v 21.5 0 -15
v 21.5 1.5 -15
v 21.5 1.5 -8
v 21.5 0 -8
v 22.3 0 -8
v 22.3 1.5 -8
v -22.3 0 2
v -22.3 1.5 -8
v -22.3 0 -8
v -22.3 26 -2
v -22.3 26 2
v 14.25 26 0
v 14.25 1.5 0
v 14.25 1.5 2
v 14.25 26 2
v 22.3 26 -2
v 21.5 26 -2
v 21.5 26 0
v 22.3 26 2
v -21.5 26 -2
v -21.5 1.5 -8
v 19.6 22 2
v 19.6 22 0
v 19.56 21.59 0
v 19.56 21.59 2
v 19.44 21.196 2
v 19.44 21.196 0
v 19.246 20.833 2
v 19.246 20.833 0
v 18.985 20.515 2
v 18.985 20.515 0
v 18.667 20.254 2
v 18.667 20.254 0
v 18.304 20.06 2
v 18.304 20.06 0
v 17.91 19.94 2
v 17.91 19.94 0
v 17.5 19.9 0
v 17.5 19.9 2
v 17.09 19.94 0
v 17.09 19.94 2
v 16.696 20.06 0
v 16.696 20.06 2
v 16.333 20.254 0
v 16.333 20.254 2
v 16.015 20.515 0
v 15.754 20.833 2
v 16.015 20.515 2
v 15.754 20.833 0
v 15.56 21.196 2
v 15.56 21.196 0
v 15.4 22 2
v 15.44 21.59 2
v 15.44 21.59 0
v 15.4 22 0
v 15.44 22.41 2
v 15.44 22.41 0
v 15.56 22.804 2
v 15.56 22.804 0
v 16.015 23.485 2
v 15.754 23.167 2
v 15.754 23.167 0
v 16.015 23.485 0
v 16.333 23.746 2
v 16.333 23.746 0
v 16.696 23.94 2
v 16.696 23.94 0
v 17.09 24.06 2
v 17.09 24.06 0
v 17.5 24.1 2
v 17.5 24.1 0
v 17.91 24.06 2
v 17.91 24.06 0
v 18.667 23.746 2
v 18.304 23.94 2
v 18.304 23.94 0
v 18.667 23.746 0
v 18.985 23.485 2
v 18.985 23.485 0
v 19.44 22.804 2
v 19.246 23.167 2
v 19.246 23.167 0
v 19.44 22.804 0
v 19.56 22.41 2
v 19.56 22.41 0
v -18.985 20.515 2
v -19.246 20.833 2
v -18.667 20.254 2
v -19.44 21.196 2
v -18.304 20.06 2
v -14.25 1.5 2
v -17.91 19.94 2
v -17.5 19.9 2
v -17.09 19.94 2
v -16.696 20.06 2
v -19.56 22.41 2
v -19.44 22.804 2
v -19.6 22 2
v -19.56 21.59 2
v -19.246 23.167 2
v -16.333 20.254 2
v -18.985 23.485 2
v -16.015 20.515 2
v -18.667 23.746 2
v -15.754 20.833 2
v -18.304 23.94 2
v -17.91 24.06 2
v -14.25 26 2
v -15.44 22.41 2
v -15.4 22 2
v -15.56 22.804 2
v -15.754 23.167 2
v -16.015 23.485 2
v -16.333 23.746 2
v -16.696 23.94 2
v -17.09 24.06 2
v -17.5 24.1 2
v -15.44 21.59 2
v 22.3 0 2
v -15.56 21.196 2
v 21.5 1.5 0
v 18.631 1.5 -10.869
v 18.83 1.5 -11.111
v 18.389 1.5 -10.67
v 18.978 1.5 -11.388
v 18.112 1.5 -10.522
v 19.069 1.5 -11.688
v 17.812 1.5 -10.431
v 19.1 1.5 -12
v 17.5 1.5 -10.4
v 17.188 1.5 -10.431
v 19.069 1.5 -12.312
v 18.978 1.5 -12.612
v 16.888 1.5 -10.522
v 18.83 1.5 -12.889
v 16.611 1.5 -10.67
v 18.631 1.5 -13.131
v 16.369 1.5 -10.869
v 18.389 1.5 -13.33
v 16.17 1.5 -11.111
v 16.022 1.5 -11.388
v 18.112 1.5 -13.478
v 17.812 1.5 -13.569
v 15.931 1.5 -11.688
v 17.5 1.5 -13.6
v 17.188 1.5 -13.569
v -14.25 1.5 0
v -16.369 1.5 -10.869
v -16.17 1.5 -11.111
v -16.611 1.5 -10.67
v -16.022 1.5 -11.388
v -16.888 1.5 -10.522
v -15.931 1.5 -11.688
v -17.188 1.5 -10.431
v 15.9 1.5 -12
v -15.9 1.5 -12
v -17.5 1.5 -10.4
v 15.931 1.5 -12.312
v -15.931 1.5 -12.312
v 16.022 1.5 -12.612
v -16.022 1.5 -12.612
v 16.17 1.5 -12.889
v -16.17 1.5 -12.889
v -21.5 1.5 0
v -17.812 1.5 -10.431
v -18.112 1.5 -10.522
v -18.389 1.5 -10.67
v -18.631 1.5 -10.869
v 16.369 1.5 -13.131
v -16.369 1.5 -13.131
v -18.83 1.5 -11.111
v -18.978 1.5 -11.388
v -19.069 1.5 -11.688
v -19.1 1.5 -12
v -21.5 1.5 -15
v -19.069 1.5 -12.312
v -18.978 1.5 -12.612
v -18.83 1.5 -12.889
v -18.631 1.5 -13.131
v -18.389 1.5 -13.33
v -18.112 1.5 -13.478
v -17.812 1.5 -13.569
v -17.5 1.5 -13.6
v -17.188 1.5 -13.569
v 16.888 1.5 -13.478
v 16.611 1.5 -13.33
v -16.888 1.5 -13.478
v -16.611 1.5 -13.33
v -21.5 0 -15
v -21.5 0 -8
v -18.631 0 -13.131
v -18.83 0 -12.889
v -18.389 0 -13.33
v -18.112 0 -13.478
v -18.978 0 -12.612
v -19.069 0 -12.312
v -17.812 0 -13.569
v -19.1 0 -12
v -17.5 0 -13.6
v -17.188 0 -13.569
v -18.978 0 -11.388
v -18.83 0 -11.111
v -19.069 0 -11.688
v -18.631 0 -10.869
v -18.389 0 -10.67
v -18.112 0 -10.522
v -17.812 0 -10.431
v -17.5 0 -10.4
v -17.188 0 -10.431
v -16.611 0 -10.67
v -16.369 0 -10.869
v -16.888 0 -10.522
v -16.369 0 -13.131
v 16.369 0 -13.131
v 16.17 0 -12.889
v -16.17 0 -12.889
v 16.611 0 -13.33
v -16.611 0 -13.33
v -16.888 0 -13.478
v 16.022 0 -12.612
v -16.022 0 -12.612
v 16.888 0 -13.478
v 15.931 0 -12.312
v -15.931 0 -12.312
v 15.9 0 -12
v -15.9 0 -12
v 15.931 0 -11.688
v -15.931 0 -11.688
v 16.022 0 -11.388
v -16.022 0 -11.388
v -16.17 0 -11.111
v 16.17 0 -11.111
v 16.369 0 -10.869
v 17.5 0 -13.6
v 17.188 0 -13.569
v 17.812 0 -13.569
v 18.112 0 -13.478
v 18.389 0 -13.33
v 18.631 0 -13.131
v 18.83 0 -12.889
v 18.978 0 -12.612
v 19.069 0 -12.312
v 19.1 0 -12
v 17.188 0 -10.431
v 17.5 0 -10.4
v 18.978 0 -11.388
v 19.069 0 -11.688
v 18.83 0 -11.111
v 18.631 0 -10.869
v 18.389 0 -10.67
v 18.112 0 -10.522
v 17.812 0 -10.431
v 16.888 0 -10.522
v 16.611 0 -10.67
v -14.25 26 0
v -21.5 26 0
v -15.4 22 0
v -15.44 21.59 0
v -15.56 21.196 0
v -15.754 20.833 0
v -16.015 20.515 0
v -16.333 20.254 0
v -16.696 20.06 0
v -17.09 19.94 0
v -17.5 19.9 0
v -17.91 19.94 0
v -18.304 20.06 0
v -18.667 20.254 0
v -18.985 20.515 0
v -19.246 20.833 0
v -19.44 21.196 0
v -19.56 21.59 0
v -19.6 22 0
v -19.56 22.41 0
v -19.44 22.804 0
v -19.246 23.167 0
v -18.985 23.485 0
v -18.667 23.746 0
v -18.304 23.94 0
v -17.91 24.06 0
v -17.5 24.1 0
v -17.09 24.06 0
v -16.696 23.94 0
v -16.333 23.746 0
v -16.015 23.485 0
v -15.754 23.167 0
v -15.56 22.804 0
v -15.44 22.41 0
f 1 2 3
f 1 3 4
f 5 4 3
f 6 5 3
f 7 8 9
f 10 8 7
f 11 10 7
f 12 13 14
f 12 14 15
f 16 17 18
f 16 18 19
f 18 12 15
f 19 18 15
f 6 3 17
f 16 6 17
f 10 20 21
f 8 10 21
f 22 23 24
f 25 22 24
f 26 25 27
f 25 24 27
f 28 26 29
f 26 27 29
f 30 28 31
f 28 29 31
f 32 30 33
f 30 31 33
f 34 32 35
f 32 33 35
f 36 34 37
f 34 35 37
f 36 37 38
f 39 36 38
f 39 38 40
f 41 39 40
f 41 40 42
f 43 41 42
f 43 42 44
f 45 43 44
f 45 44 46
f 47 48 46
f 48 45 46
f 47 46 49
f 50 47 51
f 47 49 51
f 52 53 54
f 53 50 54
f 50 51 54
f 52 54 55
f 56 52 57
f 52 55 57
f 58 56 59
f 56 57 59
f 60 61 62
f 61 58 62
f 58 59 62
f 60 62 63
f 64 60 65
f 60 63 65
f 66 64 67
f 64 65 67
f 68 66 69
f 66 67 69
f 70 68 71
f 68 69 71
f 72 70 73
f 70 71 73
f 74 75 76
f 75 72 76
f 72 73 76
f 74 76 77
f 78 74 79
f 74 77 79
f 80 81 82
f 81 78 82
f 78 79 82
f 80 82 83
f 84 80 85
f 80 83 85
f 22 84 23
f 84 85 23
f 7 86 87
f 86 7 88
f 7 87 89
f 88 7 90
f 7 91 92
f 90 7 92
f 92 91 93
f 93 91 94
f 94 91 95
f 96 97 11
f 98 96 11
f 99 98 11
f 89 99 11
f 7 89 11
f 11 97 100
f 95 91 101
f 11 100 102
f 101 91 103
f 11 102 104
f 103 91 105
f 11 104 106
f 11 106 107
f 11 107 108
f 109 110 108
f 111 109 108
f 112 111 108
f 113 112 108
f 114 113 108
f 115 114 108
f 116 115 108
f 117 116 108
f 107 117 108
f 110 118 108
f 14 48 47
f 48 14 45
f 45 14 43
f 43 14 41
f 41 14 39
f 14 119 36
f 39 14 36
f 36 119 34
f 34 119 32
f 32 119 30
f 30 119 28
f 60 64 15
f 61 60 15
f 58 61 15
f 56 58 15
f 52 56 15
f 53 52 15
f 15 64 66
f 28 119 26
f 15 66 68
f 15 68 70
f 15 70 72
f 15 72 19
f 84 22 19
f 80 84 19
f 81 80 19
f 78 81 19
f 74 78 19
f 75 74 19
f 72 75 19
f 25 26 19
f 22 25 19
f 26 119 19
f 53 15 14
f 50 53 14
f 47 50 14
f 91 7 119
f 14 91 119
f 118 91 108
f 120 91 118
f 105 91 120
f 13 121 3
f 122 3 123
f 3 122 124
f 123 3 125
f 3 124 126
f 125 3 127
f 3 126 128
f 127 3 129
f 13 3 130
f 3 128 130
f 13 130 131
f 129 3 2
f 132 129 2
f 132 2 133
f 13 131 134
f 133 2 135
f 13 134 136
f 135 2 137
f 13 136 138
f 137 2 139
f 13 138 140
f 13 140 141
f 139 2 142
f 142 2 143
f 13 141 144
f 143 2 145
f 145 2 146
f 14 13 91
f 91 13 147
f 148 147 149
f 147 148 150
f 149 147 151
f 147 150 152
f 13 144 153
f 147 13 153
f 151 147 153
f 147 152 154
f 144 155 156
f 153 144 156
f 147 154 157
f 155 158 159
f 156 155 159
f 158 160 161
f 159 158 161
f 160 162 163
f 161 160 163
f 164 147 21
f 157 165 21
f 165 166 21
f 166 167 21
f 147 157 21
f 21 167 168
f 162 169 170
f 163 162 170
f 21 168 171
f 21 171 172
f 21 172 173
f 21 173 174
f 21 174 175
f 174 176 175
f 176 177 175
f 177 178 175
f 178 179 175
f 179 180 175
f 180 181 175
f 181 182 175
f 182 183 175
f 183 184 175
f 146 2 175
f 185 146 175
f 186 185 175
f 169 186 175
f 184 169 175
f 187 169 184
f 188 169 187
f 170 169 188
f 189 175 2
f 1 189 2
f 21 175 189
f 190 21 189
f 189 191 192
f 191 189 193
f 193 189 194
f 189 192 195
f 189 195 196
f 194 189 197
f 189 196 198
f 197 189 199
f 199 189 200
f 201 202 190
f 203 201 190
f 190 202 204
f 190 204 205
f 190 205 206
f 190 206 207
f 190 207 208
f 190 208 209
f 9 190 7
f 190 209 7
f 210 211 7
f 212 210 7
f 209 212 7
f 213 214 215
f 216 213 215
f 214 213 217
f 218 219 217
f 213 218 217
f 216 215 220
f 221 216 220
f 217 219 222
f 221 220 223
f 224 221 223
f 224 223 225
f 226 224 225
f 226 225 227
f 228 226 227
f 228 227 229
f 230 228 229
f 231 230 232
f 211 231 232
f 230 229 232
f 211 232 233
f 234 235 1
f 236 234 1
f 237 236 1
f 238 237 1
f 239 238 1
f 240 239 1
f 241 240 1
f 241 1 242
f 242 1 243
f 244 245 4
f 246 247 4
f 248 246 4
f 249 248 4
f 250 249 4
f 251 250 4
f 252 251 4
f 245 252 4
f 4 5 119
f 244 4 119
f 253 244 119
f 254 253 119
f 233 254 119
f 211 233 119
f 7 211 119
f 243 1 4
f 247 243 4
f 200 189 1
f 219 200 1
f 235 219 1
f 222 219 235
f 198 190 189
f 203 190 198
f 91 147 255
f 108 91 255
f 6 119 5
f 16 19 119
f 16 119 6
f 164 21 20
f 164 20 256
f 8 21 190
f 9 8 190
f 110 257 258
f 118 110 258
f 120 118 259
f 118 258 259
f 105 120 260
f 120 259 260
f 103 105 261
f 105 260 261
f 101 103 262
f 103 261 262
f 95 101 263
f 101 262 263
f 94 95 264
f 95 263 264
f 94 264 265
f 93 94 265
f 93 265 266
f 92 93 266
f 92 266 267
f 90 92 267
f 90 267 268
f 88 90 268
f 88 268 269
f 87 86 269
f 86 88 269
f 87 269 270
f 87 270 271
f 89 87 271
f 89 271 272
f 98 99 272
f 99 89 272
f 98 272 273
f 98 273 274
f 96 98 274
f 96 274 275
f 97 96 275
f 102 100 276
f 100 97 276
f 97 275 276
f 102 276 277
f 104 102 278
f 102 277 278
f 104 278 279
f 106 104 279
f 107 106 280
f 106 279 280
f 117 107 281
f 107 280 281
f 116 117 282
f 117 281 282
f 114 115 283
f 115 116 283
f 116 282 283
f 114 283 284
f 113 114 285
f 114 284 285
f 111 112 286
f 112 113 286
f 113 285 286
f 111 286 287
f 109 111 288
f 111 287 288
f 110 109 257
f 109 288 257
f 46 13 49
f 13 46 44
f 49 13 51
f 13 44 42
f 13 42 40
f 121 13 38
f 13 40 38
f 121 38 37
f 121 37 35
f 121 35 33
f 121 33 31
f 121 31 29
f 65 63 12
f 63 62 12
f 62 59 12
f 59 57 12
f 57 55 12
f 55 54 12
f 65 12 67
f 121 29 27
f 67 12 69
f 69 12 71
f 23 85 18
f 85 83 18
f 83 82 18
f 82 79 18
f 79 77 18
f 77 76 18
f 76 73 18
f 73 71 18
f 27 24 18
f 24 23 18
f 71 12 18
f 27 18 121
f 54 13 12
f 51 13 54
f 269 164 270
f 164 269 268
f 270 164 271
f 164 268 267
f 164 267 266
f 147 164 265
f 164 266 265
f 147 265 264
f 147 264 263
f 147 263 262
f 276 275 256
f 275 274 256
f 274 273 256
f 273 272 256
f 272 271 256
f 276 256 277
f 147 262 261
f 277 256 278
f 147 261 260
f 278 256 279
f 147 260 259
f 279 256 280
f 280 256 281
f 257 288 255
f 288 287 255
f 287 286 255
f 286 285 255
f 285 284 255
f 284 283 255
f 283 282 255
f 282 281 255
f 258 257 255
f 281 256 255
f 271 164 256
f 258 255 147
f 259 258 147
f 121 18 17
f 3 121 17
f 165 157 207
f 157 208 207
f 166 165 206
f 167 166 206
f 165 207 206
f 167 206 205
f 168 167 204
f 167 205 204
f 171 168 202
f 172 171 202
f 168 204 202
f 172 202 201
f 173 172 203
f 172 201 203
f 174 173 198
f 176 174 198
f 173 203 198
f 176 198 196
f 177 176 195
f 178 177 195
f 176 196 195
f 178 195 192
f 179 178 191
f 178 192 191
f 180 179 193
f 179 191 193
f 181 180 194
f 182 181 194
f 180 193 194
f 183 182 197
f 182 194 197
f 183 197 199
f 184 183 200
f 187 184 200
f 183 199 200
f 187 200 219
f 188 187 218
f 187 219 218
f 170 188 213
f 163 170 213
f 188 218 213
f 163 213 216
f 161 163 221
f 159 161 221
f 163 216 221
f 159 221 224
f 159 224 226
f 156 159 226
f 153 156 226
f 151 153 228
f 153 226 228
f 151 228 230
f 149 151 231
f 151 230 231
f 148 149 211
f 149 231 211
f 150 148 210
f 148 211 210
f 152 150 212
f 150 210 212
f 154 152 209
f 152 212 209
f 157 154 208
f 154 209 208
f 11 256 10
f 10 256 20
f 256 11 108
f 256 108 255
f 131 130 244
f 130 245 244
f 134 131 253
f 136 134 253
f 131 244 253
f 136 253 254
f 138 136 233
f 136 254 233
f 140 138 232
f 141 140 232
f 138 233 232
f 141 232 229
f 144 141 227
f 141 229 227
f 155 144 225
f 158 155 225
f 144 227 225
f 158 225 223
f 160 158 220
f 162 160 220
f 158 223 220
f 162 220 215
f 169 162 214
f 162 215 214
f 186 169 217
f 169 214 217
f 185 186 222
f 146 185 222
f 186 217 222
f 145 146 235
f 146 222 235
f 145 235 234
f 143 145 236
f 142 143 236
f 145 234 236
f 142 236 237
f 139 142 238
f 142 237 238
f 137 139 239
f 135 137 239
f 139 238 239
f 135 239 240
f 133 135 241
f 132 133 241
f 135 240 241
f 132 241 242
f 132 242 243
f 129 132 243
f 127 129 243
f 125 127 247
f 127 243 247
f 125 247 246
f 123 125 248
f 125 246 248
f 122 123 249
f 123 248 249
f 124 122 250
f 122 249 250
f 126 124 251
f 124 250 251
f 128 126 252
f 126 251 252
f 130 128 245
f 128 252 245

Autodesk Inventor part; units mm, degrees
ref_plane "YZ Plane" through (0, 0, 0) normal (1, 0, 0) x (0, 1, 0)
ref_plane "XZ Plane" through (0, 0, 0) normal (0, 1, 0) x (-1, 0, 0)
ref_plane "XY Plane" through (0, 0, 0) normal (0, 0, 1) x (1, 0, 0)
sketch "スケッチ1" plane through (0, 0, 0) normal (0, 0, 1) x (1, 0, 0)
  line L0 (0, 0) -> (0, 23.3181) construction
  line L1 (-22.6457, 22) -> (22.6457, 22) construction
  line L2 (-20.3832, 1.5) -> (20.3832, 1.5) construction
  circle A0 centre (0, 22) radius 14 construction
  line L3 (-22.6457, 14) -> (22.6457, 14) construction
  circle A1 centre (-17.5, 22) radius 2.1
  circle A2 centre (17.5, 22) radius 2.1
  line L4 (-21.5, 26) -> (-21.5, 0)
  line L5 (-21.5, 0) -> (-14.25, 0)
  line L6 (-14.25, 0) -> (-14.25, 26)
  line L7 (21.5, 26) -> (21.5, 0)
  line L8 (21.5, 0) -> (14.25, 0)
  line L9 (14.25, 0) -> (14.25, 26)
  line L10 (-14.25, 26) -> (-21.5, 26)
  line L11 (14.25, 26) -> (21.5, 26)
  line L12 (21.5, 1.5) -> (-21.5, 1.5)
  line L13 (-21.5, 1.5) -> (-21.5, 0)
  line L14 (-21.5, 0) -> (21.5, 0)
  line L15 (21.5, 0) -> (21.5, 1.5)
  point P0 (0, 1.5)
  point P1 (0, 14)
  point P2 (14.25, 1.5)
  point P3 (-14.25, 1.5)
  point P4 (0, 0)
  dimension "d0" = 28
  dimension "d1" = 1.5
  dimension "d2" = 8
  dimension "d3" = 4.2
  dimension "d4" = 35
  dimension "d29" = 3.25
  dimension "d30" = 3.25
  dimension "d31" = 4
  dimension "d32" = 4
  dimension "d46" = 22
  dimension "d47" = 4
extrude "前" add sketch "スケッチ1" along normal blind 2
extrude "底" add sketch "スケッチ1" against normal blind 15 contours L12 L6 L5 L4 | L12 L9 L14 L6 | L12 L7 L8 L9
sketch "スケッチ5" plane through (-14.25, 1.5, 2) normal (0, 1, 0) x (1, 0, 0)
  line L0 (14.25, -6.214) -> (14.25, 25.3742) construction
  line L1 (28.5, 0) -> (0, 0) construction
  point P0 (14.25, 2)
  point P1 (-3.25, 14)
  point P2 (31.75, 14)
  dimension "d33" = 35
  dimension "d34" = 14
hole "穴2" at (-17.5, 1.5, -12) at (17.5, 1.5, -12) direction (0, -1, 0) diameter 3.2 end through all
sketch "スケッチ6" plane through (21.5, 1.5, 0) normal (1, 0, 0) x (0, 0, -1)
  line L0 (2, 24.5) -> (-2, 24.5)
  line L1 (-2, 24.5) -> (-2, 0) projected
  line L2 (-2, 24.5) -> (-2, -1.5)
  line L3 (-2, -1.5) -> (8, -1.5)
  line L4 (8, -1.5) -> (8, 0)
  line L5 (8, 0) -> (2, 24.5)
  point P0 (0, -1.5)
  point P1 (15, 0)
  dimension "d42" = 4
  dimension "d43" = 10
extrude "押し出し5" add sketch "スケッチ6" along normal blind 0.8
mirror "ミラー3" about plane through (0, 0, 0) normal (1, 0, 0) of "押し出し5"
equation "\"d30\" = d29"
equation "\"d32\" = d31"
properties part number "28BYJ-48_Braket3"
